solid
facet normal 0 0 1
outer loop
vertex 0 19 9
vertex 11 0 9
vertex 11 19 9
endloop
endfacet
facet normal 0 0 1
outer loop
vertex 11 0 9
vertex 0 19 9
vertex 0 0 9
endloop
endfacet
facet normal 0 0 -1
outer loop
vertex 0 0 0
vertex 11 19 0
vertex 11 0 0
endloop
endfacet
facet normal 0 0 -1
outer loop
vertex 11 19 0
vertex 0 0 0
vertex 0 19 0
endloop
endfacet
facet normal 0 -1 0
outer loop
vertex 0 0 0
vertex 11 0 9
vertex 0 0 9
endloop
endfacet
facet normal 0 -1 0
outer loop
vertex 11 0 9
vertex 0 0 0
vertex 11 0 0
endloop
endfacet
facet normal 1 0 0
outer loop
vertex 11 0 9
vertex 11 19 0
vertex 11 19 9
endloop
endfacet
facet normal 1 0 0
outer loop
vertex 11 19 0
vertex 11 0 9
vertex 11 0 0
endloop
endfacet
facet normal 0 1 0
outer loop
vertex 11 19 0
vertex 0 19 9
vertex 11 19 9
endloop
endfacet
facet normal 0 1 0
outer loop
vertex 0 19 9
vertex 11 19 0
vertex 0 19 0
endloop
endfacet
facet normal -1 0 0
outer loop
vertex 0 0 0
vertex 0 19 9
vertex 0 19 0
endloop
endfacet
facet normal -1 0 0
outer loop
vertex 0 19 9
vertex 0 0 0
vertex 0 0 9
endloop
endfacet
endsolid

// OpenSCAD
// Generated by SolidPython 1.0.1 on 2020-07-29 00:46:55


cube(size = [11, 19, 9]);
/***********************************************
*********      SolidPython code:      **********
************************************************
 
# import packages: SolidPython
from solid import *
from solid.utils import *
from itertools import chain, combinations, permutations


class Resize:

    def __init__(self, scad_file):
        self.scad_file = scad_file
        #self.scad_file = import_scad(scad_file)
        # cone/cylinder param:
        self.r1 = 0
        self.r2 = 0
        self.h = 0
        # rectangular prism param:
        self.w = 0
        self.l = 0
        # ellipse param:
        self.r = 0

    # import OpenScad code (file name corresponds to shape)


    # classify shape + parameters
    def assign(self, param1, param2, param3):
        if self.scad_file == 'cone.scad':
            self.r1 = param1
            self.r2 = param2
            self.h = param3
        elif self.scad_file == 'cylinder.scad':
            self.r1 = param1
            self.r2 = param2
            self.h = param3
        elif self.scad_file == 'rectangularPrism.scad':
            self.h = param1
            self.l = param2
            self.w = param3
        else:
            self.r = param1
            self.h = param2

    # resize parameters
    def iterate(self):
        x = range(3, 20, 2)
        i = 1
        if self.scad_file == 'cone.scad':
            tempList = list(permutations(x, 2))
            for temp in tempList:
                param1 = temp[0]
                param2 = temp[1]
                filepath = 'produced_scad_files/' + 'cone' + str(param1) + '_' + str(param2) + '_' + '.scad'
                scad_render_to_file(cylinder(h=param1, r1=param2, r2=0), filepath)

        elif self.scad_file == 'cylinder.scad':
            tempList = list(permutations(x, 3))
            for temp in tempList:
                param1 = temp[0]
                param2 = temp[1]
                filepath = 'produced_scad_files/' + 'cylinder' + str(param1) + '_' + str(param2) + '_' + '.scad'
                scad_render_to_file(cylinder(h=param1, r1=param2, r2=param2), filepath)

        elif self.scad_file == 'rectangularPrism.scad':
            tempList = list(permutations(x, 3))
            for temp in tempList:
                param1 = temp[0]
                param2 = temp[1]
                param3 = temp[2]
                filepath = 'produced_scad_files/' + 'rectangularPrism' + str(param1) + '_' + str(param2) + '_' + str(
                    param3) + '.scad'
                scad_render_to_file(cube(size=(param1, param2, param3)), filepath)

        elif self.scad_file == 'ellipse.scad':
            tempList = list(permutations(x, 4))
            for temp in tempList:
                param1 = temp[0]
                param2 = temp[1]
                param3 = temp[2]
                param4 = temp[3]
                filepath = 'produced_scad_files/' + 'ellipse' + str(param1) + '_' + str(param2) + '_' + str(param3) + '_' + str(param4) + '.scad'
                scad_render_to_file(scale([param1, param2, param3])(sphere(r=param4)), filepath)

    def render_to_scadfile(self):
        scad_render_to_file(scad, 'example.scad') 
 
************************************************/
